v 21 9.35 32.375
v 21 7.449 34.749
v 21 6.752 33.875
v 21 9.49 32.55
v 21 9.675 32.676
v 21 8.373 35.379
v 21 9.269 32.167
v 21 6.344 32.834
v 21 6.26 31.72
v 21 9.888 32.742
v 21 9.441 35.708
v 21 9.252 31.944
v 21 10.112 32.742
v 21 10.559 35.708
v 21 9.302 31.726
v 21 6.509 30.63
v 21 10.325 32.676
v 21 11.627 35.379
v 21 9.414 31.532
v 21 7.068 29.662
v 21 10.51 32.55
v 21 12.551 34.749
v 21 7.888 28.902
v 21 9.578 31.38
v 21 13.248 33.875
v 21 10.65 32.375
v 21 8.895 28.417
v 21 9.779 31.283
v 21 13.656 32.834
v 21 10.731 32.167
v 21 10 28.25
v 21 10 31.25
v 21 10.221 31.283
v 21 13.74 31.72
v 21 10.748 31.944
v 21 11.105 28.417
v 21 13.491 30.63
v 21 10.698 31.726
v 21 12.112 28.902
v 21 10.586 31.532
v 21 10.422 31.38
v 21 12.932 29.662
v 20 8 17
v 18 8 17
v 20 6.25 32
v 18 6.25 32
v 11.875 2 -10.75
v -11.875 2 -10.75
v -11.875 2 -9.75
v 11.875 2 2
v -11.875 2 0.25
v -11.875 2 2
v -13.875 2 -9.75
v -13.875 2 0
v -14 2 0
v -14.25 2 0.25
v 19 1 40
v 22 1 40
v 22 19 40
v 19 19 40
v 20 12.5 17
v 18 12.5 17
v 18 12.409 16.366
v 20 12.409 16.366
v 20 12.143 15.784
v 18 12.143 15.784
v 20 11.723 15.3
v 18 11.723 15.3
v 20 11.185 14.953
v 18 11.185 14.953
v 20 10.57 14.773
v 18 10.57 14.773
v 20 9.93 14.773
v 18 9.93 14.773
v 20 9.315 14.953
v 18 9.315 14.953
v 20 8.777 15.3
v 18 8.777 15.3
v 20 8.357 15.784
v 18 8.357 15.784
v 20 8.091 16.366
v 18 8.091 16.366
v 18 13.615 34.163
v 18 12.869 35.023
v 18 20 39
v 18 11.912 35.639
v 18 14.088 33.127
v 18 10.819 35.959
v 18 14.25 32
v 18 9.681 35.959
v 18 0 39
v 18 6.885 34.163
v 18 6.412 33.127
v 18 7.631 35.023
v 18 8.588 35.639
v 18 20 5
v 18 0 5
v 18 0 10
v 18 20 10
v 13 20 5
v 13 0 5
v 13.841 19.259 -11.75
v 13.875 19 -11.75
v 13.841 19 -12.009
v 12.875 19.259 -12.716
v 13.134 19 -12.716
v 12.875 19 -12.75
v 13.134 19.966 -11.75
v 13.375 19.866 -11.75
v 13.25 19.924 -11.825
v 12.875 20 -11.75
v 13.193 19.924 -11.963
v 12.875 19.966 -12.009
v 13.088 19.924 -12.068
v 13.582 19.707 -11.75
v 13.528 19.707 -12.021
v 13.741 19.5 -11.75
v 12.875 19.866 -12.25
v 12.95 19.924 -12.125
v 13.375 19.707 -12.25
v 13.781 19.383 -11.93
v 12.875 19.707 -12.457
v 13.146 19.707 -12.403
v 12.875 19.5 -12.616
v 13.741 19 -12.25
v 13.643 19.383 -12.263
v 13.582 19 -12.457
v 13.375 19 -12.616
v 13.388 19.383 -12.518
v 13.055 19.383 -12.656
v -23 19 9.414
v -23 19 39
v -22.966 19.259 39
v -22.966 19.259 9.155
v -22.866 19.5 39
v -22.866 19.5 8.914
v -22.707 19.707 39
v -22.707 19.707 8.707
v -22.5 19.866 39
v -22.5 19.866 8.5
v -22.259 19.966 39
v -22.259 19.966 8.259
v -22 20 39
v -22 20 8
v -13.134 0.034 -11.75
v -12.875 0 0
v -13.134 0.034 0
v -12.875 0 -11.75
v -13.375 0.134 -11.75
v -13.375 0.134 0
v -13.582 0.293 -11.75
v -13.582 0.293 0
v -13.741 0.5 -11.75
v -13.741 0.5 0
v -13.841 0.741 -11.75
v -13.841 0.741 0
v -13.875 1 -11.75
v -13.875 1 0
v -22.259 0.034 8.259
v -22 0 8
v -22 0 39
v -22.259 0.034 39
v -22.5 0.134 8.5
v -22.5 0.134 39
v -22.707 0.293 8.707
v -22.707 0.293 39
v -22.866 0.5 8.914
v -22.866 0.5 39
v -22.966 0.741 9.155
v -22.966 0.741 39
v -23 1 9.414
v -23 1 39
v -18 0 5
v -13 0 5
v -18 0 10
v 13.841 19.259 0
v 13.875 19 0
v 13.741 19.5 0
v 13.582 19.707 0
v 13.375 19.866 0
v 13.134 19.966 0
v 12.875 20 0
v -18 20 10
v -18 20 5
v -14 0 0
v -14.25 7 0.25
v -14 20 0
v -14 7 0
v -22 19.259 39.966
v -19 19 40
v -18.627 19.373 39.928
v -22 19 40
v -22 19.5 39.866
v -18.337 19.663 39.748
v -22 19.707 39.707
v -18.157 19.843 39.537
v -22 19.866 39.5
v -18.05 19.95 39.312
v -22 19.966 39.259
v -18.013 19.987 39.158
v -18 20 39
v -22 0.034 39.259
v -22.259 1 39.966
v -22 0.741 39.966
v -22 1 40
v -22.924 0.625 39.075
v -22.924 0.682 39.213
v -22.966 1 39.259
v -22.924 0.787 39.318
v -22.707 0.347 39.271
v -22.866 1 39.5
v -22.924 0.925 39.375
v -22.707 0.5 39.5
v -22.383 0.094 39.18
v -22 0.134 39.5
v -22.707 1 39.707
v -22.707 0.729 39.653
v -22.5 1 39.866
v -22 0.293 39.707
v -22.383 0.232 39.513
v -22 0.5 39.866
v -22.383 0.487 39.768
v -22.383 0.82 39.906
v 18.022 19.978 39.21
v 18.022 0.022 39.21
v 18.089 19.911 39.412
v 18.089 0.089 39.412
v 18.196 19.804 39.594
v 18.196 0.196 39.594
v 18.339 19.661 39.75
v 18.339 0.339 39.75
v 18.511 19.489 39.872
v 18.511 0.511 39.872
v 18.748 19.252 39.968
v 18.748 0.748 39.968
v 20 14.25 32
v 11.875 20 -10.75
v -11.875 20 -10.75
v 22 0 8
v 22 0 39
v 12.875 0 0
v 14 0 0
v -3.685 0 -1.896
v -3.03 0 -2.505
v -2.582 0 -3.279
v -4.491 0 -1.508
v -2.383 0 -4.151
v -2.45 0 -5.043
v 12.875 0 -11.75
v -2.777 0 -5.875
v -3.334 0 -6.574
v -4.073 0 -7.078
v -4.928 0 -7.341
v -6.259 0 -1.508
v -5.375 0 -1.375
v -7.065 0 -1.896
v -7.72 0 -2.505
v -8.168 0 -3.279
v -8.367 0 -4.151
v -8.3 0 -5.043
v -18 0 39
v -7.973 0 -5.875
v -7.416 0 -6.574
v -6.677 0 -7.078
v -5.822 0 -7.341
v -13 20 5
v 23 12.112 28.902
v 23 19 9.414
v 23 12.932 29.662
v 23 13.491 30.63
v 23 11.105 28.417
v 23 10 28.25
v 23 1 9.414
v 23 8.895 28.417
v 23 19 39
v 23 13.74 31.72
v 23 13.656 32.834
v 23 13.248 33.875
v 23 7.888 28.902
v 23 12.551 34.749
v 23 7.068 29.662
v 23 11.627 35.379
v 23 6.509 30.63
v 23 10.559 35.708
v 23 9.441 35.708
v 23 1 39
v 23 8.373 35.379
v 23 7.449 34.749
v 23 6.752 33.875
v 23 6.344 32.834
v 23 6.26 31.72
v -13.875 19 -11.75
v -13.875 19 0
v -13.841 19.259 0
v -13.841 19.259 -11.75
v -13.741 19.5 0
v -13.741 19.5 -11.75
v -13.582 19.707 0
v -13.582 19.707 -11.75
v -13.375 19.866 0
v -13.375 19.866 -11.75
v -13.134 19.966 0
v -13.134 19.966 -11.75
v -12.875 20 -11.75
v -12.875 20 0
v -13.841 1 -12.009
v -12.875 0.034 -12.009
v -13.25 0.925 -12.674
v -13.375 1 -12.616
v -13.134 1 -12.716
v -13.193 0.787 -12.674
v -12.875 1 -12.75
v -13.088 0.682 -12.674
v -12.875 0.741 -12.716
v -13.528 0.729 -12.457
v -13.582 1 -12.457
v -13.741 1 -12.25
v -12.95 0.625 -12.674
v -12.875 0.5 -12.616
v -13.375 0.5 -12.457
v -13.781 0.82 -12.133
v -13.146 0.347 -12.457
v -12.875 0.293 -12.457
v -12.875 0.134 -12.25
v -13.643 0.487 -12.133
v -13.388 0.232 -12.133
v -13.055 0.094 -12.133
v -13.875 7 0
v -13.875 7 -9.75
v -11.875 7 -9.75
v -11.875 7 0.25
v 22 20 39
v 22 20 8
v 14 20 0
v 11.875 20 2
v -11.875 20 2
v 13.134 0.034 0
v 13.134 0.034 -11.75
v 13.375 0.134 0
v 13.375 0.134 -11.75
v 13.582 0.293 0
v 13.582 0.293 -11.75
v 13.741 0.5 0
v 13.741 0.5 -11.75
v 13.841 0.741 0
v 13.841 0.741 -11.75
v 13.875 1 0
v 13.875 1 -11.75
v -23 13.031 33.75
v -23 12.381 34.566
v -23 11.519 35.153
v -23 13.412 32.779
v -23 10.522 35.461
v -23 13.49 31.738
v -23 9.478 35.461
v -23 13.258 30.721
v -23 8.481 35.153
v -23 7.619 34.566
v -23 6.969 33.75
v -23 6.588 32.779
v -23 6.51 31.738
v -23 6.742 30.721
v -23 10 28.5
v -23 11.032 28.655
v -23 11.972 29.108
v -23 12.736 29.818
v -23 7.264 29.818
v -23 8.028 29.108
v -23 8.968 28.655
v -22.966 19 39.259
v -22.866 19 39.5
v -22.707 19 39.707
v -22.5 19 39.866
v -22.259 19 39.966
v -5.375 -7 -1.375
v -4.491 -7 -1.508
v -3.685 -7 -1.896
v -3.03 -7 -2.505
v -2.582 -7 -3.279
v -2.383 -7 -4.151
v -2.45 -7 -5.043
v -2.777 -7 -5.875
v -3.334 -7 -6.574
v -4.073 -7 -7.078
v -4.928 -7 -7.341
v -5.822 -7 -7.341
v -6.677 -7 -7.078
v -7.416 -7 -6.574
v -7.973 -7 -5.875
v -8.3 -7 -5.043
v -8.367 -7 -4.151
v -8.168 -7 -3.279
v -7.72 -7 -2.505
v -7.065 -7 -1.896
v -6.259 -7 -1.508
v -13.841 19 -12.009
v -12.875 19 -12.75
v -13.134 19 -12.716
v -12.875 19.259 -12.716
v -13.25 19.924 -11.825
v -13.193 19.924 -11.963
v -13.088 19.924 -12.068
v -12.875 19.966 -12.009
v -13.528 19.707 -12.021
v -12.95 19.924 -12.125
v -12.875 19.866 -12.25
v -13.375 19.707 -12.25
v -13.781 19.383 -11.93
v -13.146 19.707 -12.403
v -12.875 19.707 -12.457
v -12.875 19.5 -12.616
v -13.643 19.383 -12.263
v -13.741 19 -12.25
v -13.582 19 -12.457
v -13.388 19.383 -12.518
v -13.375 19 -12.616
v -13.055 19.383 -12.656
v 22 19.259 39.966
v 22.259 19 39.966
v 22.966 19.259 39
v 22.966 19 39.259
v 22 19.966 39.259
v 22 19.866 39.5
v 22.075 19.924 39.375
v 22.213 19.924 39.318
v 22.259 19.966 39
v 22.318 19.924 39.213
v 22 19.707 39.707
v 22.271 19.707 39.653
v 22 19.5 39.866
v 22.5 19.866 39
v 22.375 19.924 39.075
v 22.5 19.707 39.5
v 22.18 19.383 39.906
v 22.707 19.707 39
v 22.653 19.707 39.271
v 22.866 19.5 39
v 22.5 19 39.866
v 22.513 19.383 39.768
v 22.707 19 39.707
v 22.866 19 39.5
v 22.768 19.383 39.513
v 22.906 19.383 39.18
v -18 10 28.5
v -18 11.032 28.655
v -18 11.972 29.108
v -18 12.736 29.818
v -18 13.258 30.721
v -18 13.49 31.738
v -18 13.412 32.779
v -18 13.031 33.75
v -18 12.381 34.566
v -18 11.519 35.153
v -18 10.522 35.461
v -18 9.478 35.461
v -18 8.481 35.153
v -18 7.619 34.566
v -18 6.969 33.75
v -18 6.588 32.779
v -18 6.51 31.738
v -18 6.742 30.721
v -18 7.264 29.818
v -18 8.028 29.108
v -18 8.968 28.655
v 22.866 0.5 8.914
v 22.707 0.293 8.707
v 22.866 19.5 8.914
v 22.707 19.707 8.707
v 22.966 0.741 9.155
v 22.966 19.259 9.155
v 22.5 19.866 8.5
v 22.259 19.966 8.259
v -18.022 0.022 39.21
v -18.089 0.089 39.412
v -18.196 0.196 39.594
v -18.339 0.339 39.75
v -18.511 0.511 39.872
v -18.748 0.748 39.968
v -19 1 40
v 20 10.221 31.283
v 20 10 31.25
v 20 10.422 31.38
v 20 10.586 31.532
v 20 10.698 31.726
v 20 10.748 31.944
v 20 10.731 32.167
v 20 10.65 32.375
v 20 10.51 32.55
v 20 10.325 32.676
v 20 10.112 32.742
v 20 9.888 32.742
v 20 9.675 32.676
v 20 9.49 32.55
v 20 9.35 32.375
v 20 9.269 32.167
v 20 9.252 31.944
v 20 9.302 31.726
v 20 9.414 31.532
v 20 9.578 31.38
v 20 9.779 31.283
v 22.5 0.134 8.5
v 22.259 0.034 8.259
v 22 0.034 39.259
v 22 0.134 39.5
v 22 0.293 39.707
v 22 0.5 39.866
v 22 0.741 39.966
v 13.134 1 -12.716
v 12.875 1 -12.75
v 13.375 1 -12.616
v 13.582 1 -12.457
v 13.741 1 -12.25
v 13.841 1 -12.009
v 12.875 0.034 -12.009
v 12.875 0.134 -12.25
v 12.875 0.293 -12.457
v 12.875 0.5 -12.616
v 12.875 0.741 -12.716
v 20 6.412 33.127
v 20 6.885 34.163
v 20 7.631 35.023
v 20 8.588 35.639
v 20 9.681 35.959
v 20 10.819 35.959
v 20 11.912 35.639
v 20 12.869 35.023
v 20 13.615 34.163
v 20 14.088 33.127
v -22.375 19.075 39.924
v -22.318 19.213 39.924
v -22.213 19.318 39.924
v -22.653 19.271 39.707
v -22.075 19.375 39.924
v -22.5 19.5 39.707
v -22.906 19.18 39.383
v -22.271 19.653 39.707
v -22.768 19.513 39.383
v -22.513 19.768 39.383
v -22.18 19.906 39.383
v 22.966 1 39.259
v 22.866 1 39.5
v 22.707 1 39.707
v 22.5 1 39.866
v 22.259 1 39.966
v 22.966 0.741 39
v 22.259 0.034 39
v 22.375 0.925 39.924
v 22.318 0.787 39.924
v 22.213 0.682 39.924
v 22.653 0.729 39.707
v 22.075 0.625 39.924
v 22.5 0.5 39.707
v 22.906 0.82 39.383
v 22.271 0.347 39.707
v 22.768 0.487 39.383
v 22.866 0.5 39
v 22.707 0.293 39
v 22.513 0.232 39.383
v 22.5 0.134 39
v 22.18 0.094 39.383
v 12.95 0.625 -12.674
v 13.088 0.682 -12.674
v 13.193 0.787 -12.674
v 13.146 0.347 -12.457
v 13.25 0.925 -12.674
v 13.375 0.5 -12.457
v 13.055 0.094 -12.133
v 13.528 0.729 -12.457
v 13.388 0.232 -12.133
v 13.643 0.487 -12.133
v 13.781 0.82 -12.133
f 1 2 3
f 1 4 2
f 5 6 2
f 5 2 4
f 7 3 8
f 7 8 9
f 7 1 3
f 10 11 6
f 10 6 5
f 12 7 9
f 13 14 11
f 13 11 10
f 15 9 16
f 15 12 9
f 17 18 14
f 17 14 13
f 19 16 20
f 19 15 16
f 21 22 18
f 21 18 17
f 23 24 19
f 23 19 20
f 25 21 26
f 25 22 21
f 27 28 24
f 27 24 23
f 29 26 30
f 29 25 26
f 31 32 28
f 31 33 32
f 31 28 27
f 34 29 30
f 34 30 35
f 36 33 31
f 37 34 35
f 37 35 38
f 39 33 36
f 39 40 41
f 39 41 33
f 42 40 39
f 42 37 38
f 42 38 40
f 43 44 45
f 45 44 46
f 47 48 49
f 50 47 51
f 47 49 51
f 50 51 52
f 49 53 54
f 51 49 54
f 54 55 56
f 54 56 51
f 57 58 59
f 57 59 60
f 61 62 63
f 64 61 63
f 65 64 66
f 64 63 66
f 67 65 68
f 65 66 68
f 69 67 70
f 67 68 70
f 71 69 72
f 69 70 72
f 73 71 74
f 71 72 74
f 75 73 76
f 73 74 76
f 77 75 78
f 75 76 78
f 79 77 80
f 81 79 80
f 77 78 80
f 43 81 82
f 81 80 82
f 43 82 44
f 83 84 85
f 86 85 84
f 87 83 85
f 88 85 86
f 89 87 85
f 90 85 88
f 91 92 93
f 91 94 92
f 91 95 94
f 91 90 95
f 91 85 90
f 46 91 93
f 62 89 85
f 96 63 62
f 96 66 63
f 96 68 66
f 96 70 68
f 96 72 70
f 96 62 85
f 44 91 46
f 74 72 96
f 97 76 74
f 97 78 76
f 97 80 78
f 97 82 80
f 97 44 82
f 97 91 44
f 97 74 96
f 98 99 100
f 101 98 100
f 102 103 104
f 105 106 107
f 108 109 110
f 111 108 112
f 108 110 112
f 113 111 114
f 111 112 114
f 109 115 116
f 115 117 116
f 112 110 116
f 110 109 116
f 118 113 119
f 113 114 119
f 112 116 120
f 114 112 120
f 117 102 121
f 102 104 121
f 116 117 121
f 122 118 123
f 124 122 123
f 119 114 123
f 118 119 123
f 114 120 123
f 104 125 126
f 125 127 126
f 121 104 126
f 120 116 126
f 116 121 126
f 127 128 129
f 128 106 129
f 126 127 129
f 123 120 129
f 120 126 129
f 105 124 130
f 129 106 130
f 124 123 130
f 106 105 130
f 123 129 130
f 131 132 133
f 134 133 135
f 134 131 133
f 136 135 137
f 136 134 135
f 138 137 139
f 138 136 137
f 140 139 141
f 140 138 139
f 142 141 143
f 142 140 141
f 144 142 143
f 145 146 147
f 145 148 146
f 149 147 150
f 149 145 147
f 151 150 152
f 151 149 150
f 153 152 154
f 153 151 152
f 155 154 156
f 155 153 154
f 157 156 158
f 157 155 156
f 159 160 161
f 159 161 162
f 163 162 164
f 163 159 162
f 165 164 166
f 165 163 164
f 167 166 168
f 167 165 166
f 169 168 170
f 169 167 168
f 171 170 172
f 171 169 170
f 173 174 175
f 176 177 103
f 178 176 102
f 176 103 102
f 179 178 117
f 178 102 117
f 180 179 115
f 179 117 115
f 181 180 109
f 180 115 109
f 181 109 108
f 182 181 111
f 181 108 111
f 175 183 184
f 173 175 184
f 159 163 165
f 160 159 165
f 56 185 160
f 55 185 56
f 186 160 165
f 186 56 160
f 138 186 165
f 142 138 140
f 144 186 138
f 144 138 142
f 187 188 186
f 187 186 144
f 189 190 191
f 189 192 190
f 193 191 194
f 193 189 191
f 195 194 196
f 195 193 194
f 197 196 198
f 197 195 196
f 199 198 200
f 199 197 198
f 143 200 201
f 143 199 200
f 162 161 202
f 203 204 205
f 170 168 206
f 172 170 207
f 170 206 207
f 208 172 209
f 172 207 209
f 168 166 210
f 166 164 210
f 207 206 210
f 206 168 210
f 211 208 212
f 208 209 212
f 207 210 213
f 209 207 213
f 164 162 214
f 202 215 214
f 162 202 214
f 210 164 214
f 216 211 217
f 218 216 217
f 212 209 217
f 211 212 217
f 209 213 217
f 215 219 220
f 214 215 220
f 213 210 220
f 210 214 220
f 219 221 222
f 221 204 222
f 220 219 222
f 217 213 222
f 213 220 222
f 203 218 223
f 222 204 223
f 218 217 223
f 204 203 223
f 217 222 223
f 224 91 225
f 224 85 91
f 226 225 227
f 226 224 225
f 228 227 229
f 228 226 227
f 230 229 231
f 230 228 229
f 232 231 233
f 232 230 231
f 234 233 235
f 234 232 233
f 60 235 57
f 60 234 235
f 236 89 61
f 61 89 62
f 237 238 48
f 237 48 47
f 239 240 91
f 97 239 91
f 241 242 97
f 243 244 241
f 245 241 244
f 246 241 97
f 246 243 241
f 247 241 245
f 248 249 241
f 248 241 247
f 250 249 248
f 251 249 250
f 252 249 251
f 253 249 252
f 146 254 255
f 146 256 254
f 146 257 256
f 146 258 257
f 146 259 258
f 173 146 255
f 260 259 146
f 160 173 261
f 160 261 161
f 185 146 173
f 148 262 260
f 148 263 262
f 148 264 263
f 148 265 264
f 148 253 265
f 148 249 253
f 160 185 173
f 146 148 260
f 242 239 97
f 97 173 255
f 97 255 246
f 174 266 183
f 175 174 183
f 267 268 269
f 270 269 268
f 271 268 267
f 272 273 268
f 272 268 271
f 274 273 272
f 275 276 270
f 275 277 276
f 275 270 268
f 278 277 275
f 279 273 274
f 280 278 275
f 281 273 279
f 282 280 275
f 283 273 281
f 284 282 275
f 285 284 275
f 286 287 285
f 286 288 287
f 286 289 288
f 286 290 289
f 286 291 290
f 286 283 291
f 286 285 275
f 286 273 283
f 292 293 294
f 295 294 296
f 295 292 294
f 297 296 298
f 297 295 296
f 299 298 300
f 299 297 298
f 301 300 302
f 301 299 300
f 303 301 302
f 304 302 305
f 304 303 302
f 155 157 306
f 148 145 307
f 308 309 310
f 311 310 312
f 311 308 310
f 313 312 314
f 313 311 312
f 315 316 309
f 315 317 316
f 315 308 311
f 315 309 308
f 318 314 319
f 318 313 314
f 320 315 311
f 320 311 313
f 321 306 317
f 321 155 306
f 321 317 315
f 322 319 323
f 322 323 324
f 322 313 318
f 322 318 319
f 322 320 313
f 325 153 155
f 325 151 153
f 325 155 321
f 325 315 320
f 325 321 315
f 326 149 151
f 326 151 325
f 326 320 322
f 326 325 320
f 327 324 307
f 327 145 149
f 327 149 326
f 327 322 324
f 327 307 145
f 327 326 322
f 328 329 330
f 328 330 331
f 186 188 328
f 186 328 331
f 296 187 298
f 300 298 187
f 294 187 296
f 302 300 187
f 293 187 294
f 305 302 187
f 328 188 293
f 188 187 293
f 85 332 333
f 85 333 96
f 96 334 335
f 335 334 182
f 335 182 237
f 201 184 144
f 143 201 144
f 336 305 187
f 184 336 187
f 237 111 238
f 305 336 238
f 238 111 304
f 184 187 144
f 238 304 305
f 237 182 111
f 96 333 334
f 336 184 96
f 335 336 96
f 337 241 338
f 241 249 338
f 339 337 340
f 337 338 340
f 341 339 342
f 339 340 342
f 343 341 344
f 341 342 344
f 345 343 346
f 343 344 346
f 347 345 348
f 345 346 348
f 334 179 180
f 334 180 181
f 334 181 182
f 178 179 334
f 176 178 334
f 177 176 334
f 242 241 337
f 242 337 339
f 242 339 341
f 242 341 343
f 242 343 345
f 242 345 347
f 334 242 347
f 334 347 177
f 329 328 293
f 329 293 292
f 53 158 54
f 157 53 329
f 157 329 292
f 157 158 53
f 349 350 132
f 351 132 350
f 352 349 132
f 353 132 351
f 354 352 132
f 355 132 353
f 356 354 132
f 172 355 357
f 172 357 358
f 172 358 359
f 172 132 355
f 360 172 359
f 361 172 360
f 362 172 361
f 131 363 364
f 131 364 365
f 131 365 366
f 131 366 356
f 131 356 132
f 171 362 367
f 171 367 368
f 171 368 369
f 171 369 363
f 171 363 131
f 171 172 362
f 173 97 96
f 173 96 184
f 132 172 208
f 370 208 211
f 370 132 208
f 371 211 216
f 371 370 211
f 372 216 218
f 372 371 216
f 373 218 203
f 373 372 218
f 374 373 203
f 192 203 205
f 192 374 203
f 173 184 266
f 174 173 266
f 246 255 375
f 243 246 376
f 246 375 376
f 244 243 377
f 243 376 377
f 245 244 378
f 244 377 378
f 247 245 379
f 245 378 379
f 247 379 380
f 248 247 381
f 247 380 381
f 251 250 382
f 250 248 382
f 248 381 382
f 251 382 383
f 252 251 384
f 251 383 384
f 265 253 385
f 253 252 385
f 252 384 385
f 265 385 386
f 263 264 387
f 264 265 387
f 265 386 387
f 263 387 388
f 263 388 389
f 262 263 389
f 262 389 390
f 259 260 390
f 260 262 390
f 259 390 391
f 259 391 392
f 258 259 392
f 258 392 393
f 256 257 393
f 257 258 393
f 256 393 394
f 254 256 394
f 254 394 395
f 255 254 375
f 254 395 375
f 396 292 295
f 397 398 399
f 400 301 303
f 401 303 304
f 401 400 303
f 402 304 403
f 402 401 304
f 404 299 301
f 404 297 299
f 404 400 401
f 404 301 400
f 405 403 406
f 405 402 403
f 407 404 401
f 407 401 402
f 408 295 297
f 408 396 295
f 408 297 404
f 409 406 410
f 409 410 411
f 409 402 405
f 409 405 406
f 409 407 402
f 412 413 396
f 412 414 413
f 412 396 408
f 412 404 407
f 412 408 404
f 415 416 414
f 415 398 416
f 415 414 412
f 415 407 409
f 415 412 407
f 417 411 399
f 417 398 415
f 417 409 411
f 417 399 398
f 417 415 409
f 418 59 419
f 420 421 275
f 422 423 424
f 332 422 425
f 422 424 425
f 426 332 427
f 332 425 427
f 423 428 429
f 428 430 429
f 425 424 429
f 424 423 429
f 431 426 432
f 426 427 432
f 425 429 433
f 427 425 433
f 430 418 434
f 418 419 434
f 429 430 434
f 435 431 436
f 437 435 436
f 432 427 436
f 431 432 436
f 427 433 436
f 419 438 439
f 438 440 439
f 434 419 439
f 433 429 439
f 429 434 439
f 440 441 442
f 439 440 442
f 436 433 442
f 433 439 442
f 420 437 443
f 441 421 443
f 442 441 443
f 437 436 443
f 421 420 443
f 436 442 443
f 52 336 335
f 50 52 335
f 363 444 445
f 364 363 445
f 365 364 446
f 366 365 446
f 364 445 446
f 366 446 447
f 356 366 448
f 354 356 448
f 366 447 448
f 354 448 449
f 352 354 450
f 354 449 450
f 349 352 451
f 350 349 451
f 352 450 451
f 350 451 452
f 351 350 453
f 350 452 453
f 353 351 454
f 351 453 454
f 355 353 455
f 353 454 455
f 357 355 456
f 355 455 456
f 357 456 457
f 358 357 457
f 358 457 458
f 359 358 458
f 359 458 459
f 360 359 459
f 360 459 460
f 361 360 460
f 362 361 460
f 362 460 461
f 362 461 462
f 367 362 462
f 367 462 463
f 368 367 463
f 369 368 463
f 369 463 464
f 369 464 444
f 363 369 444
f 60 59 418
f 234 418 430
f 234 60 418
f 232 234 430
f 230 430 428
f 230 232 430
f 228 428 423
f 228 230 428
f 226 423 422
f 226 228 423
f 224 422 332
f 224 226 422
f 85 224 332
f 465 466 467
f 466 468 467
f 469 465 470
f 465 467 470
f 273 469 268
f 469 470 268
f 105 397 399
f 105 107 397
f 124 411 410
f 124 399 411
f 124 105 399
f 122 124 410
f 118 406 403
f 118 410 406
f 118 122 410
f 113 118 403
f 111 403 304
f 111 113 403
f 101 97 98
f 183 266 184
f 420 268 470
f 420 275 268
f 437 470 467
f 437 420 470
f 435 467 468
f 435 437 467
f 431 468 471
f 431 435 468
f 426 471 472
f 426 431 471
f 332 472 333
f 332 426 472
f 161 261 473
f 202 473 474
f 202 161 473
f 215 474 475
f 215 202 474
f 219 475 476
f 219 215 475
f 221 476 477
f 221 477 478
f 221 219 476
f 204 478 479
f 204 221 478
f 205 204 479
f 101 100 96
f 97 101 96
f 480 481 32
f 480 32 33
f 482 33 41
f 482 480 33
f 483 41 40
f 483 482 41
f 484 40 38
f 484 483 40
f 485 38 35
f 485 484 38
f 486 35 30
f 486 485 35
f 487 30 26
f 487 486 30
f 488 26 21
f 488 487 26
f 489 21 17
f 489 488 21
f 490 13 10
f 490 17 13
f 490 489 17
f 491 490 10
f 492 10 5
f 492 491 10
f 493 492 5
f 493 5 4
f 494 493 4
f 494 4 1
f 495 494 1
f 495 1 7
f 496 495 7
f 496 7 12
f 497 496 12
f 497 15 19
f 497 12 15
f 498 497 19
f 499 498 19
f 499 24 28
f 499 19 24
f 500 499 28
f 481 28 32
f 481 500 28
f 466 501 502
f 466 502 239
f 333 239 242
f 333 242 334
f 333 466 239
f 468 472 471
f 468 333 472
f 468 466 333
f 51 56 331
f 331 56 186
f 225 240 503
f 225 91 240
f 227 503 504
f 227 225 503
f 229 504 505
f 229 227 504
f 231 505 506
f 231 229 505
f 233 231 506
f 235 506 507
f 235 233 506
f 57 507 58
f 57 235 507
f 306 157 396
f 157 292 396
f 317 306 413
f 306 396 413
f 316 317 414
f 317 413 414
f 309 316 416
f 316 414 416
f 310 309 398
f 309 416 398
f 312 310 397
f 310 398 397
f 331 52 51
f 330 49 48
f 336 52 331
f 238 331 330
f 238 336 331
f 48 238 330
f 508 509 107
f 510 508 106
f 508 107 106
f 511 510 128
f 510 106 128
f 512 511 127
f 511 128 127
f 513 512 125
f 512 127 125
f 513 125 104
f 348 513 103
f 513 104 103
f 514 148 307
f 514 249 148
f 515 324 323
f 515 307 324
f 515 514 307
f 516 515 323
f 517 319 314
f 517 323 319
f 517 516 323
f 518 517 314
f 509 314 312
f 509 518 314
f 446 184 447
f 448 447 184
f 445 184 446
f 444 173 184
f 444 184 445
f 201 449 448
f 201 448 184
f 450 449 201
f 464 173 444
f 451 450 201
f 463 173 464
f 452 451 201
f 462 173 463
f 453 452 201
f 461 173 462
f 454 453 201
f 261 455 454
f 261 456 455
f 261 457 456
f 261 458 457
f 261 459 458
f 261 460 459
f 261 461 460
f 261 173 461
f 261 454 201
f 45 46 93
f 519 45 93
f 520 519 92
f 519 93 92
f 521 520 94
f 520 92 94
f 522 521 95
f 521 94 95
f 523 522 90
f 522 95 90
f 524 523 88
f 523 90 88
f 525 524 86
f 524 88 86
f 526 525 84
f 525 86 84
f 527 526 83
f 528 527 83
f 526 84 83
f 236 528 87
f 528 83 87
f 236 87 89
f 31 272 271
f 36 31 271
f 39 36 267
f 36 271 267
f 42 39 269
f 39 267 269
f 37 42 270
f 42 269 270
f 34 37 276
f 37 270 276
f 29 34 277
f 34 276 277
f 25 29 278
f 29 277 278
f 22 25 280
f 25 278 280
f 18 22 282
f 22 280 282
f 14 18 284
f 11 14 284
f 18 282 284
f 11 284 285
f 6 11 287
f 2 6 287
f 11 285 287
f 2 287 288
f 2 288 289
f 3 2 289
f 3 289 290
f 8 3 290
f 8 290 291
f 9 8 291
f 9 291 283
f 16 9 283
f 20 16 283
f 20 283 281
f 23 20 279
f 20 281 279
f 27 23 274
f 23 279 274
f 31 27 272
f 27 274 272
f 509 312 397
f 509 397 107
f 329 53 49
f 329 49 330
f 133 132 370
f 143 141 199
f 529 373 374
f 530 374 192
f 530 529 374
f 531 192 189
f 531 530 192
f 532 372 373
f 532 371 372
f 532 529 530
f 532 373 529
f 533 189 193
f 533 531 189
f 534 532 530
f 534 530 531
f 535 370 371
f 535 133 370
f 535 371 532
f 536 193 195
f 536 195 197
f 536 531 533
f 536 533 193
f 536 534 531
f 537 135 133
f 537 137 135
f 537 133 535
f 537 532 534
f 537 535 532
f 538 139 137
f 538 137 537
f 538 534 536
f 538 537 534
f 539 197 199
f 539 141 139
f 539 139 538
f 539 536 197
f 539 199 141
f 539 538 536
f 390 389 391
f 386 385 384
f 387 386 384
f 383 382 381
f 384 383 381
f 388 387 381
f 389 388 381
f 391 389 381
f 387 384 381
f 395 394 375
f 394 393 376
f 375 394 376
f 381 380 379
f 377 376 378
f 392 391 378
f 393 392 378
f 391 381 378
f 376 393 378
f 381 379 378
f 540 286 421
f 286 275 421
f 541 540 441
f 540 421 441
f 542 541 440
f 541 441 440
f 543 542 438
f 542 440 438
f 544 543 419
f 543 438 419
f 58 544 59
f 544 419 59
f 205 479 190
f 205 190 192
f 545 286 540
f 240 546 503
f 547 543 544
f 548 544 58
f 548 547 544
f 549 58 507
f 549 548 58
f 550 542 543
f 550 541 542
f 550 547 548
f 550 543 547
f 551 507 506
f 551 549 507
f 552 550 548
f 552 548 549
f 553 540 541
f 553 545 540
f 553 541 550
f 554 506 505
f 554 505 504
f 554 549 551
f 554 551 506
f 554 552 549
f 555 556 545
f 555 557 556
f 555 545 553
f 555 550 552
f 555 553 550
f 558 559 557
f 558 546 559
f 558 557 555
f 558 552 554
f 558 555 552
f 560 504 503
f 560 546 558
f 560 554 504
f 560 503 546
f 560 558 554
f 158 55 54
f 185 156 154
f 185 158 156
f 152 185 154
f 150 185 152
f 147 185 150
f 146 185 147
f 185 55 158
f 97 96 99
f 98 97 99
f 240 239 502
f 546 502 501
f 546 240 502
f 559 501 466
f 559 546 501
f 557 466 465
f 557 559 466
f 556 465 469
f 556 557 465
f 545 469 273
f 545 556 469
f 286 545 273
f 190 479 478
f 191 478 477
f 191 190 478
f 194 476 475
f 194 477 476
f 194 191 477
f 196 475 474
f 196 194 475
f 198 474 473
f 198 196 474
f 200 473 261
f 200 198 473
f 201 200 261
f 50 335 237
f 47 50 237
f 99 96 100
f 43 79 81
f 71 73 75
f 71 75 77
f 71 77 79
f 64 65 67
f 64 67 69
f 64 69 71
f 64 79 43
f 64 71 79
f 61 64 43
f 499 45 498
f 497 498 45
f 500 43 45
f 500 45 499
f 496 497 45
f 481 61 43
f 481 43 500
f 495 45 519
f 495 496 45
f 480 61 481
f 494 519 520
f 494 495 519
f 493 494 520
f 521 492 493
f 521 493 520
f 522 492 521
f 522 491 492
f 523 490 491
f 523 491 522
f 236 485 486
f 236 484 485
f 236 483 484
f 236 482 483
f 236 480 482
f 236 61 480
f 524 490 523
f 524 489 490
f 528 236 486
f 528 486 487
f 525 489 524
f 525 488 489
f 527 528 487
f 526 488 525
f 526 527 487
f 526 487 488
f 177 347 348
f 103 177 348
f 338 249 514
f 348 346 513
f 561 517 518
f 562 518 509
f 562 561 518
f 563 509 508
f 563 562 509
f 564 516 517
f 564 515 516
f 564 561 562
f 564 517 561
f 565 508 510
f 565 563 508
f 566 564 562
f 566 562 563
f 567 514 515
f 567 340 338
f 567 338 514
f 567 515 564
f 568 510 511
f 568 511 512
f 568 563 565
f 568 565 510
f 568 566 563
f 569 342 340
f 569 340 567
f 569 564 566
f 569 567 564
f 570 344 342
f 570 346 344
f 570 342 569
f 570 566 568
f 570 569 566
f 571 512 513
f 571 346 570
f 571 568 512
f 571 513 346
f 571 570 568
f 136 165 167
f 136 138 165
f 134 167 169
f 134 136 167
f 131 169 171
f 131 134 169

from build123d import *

# Parameters (mm, degrees)
BOSS_EXTRUDE1_DEPTH      = 20
SKETCH6_R                = 3.5
CUT_EXTRUDE1_DEPTH       = 51.289163843
CUT_EXTRUDE5_DEPTH       = 20
CUT_EXTRUDE5_DEPTH_BACK  = 0.0001
SKETCH9_W                = 27.75
SKETCH9_H                = 12.75
BOSS_EXTRUDE2_DEPTH      = 20
SKETCH10_W               = 23.75
SKETCH10_H               = 12.75
CUT_EXTRUDE7_DEPTH       = 18
BOSS_EXTRUDE3_DEPTH      = 0.001
BOSS_EXTRUDE3_DEPTH_BACK = 7
SKETCH11_R               = 3
CUT_EXTRUDE8_REACH       = 66.156
SKETCH14_W               = 10
SKETCH14_H               = 5
SKETCH15_R               = 3.75
CUT_EXTRUDE9_DEPTH       = 2
CUT_EXTRUDE10_DEPTH      = 65.156059729
CUT_EXTRUDE10_DEPTH_BACK = 65.156059729
SKETCH16_R               = 0.75
BOSS_EXTRUDE4_DEPTH      = 20
BOSS_EXTRUDE4_2_DEPTH    = 20
CHAMFER1_SIZE            = 9
FILLET3_R                = 1


with BuildPart() as part:
    # Sketch2 → Boss-Extrude1 (new body)
    with BuildSketch(Plane(origin=(0, 0, 0), x_dir=(1, 0, 0), z_dir=(0, 1, 0))):
        Polygon((-23, 0), (23, 0), (23, -40), (18, -40), (18, -5), (-18, -5), (-18, -40), (-23, -40), align=None)
    extrude(amount=BOSS_EXTRUDE1_DEPTH)

    # Sketch6 → Cut-Extrude1 (cut, through all)
    with BuildSketch(Plane(origin=(0, 0, 0), x_dir=(0, 0, -1), z_dir=(1, 0, 0))):
        with Locations((-32, 10)):
            Circle(SKETCH6_R)
    extrude(amount=-CUT_EXTRUDE1_DEPTH, mode=Mode.SUBTRACT)

    # Sketch7 → Cut-Extrude5 (cut, two sides: drawn at the far end of the back side and taken through both)
    with BuildSketch(Plane(origin=(0, 0, 0), x_dir=(0, 0, -1), z_dir=(1, 0, 0)).offset(-CUT_EXTRUDE5_DEPTH_BACK)):
        with BuildLine():
            Line((-32, 14.25), (-17, 12.5))
            ThreePointArc((-17, 12.5), (-14.75, 10.25), (-17, 8))
            Line((-17, 8), (-32, 6.25))
            ThreePointArc((-32, 6.25), (-36, 10.25), (-32, 14.25))
        make_face()
    extrude(amount=CUT_EXTRUDE5_DEPTH + CUT_EXTRUDE5_DEPTH_BACK, mode=Mode.SUBTRACT)

    # Sketch9 → Boss-Extrude2 (add)
    with BuildSketch(Plane(origin=(0, 0, 0), x_dir=(1, 0, 0), z_dir=(0, 1, 0))):
        with Locations((0, 6.375)):
            Rectangle(SKETCH9_W, SKETCH9_H)
    extrude(amount=BOSS_EXTRUDE2_DEPTH)

    # Sketch10 → Cut-Extrude7 (cut)
    with BuildSketch(Plane(origin=(0, 20, 0), x_dir=(1, 0, 0), z_dir=(0, 1, 0))):
        with Locations((0, 4.375)):
            Rectangle(SKETCH10_W, SKETCH10_H)
    extrude(amount=-CUT_EXTRUDE7_DEPTH, mode=Mode.SUBTRACT)

    # Sketch11 → Boss-Extrude3 (add, two sides: drawn at the far end of the back side and taken through both)
    with BuildSketch(Plane(origin=(0, 0, 0), x_dir=(1, 0, 0), z_dir=(0, 1, 0)).offset(-BOSS_EXTRUDE3_DEPTH_BACK)):
        with Locations(Location((-5.375, 4.375, 0), (0, 0, 270))):
            Circle(SKETCH11_R)
    extrude(amount=BOSS_EXTRUDE3_DEPTH + BOSS_EXTRUDE3_DEPTH_BACK)

    # Cut-Extrude8: up to this face of the body (flat: up to its plane)
    cut_extrude8_end = Plane(part.part.faces().sort_by_distance((-11.875, 11, -4.375))[0])
    # Sketch14 → Cut-Extrude8 (cut, up to the picked face)
    with BuildSketch(Plane.ZY.offset(23), mode=Mode.PRIVATE) as cut_extrude8_sk1:
        with Locations((-4.75, 4.5)):
            Rectangle(SKETCH14_W, SKETCH14_H)
    cut_extrude8_tool1 = split(extrude(cut_extrude8_sk1.sketch, amount=-CUT_EXTRUDE8_REACH, mode=Mode.PRIVATE), bisect_by=cut_extrude8_end, keep=Keep.BOTH, mode=Mode.PRIVATE)
    add(cut_extrude8_tool1.solids().sort_by(Axis((-23, 4.5, -4.75), (1, 0, 0)))[0], mode=Mode.SUBTRACT)

    # Sketch15 → Cut-Extrude9 (cut)
    with BuildSketch(Plane(origin=(23, 0, 0), x_dir=(0, 0, -1), z_dir=(1, 0, 0))):
        with Locations((-32, 10)):
            Circle(SKETCH15_R)
    extrude(amount=-CUT_EXTRUDE9_DEPTH, mode=Mode.SUBTRACT)

    # Sketch16 → Cut-Extrude10 (cut, two sides: drawn at the far end of the back side and taken through both)
    with BuildSketch(Plane(origin=(23, 0, 0), x_dir=(0, 0, -1), z_dir=(1, 0, 0)).offset(-CUT_EXTRUDE10_DEPTH_BACK)):
        with Locations((-32, 10)):
            Circle(SKETCH16_R)
    extrude(amount=CUT_EXTRUDE10_DEPTH + CUT_EXTRUDE10_DEPTH_BACK, mode=Mode.SUBTRACT)

    # Chamfer1
    chamfer1_edges = [part.edges().sort_by_distance(p)[0] for p in [
        (-23, 13.5, 0),
        (23, 10, 0),
    ]]
    chamfer(chamfer1_edges, length=CHAMFER1_SIZE)

    # Fillet3
    fillet3_edges = [part.edges().sort_by_distance(p)[0] for p in [
        (-20.5, 0, 40),
        (-23, 0, 24.5),
        (23, 10, 9),
        (23, 0, 24.5),
        (-23, 20, 24.5),
        (-23, 10, 9),
        (23, 10, 40),
        (18, 10, 40),
        (-18, 10, 40),
        (-23, 10, 40),
        (-20.5, 20, 40),
        (20.5, 20, 40),
        (-13.875, 0, -6.375),
        (23, 20, 24.5),
        (-13.875, 10, -12.75),
        (13.875, 0, -6.375),
        (0, 0, -12.75),
        (13.875, 10, -12.75),
        (-13.875, 20, -6.375),
        (13.875, 20, -6.375),
        (0, 20, -12.75),
        (20.5, 0, 40),
    ]]
    fillet(fillet3_edges, radius=FILLET3_R)


with BuildPart() as body_2:
    # Sketch18 → Boss-Extrude4 (new body)
    with BuildSketch(Plane(origin=(0, 20, 0), x_dir=(-1, 0, 0), z_dir=(0, -1, 0))):
        Polygon((18, -5), (13, -5), (18, -10), align=None)
    extrude(amount=BOSS_EXTRUDE4_DEPTH)


with BuildPart() as body_3:
    # Sketch18 → Boss-Extrude4 2 (new body)
    with BuildSketch(Plane(origin=(0, 20, 0), x_dir=(-1, 0, 0), z_dir=(0, -1, 0))):
        Polygon((-18, -5), (-18, -10), (-13, -5), align=None)
    extrude(amount=BOSS_EXTRUDE4_2_DEPTH)


solid = Compound([part.part, body_2.part, body_3.part])
